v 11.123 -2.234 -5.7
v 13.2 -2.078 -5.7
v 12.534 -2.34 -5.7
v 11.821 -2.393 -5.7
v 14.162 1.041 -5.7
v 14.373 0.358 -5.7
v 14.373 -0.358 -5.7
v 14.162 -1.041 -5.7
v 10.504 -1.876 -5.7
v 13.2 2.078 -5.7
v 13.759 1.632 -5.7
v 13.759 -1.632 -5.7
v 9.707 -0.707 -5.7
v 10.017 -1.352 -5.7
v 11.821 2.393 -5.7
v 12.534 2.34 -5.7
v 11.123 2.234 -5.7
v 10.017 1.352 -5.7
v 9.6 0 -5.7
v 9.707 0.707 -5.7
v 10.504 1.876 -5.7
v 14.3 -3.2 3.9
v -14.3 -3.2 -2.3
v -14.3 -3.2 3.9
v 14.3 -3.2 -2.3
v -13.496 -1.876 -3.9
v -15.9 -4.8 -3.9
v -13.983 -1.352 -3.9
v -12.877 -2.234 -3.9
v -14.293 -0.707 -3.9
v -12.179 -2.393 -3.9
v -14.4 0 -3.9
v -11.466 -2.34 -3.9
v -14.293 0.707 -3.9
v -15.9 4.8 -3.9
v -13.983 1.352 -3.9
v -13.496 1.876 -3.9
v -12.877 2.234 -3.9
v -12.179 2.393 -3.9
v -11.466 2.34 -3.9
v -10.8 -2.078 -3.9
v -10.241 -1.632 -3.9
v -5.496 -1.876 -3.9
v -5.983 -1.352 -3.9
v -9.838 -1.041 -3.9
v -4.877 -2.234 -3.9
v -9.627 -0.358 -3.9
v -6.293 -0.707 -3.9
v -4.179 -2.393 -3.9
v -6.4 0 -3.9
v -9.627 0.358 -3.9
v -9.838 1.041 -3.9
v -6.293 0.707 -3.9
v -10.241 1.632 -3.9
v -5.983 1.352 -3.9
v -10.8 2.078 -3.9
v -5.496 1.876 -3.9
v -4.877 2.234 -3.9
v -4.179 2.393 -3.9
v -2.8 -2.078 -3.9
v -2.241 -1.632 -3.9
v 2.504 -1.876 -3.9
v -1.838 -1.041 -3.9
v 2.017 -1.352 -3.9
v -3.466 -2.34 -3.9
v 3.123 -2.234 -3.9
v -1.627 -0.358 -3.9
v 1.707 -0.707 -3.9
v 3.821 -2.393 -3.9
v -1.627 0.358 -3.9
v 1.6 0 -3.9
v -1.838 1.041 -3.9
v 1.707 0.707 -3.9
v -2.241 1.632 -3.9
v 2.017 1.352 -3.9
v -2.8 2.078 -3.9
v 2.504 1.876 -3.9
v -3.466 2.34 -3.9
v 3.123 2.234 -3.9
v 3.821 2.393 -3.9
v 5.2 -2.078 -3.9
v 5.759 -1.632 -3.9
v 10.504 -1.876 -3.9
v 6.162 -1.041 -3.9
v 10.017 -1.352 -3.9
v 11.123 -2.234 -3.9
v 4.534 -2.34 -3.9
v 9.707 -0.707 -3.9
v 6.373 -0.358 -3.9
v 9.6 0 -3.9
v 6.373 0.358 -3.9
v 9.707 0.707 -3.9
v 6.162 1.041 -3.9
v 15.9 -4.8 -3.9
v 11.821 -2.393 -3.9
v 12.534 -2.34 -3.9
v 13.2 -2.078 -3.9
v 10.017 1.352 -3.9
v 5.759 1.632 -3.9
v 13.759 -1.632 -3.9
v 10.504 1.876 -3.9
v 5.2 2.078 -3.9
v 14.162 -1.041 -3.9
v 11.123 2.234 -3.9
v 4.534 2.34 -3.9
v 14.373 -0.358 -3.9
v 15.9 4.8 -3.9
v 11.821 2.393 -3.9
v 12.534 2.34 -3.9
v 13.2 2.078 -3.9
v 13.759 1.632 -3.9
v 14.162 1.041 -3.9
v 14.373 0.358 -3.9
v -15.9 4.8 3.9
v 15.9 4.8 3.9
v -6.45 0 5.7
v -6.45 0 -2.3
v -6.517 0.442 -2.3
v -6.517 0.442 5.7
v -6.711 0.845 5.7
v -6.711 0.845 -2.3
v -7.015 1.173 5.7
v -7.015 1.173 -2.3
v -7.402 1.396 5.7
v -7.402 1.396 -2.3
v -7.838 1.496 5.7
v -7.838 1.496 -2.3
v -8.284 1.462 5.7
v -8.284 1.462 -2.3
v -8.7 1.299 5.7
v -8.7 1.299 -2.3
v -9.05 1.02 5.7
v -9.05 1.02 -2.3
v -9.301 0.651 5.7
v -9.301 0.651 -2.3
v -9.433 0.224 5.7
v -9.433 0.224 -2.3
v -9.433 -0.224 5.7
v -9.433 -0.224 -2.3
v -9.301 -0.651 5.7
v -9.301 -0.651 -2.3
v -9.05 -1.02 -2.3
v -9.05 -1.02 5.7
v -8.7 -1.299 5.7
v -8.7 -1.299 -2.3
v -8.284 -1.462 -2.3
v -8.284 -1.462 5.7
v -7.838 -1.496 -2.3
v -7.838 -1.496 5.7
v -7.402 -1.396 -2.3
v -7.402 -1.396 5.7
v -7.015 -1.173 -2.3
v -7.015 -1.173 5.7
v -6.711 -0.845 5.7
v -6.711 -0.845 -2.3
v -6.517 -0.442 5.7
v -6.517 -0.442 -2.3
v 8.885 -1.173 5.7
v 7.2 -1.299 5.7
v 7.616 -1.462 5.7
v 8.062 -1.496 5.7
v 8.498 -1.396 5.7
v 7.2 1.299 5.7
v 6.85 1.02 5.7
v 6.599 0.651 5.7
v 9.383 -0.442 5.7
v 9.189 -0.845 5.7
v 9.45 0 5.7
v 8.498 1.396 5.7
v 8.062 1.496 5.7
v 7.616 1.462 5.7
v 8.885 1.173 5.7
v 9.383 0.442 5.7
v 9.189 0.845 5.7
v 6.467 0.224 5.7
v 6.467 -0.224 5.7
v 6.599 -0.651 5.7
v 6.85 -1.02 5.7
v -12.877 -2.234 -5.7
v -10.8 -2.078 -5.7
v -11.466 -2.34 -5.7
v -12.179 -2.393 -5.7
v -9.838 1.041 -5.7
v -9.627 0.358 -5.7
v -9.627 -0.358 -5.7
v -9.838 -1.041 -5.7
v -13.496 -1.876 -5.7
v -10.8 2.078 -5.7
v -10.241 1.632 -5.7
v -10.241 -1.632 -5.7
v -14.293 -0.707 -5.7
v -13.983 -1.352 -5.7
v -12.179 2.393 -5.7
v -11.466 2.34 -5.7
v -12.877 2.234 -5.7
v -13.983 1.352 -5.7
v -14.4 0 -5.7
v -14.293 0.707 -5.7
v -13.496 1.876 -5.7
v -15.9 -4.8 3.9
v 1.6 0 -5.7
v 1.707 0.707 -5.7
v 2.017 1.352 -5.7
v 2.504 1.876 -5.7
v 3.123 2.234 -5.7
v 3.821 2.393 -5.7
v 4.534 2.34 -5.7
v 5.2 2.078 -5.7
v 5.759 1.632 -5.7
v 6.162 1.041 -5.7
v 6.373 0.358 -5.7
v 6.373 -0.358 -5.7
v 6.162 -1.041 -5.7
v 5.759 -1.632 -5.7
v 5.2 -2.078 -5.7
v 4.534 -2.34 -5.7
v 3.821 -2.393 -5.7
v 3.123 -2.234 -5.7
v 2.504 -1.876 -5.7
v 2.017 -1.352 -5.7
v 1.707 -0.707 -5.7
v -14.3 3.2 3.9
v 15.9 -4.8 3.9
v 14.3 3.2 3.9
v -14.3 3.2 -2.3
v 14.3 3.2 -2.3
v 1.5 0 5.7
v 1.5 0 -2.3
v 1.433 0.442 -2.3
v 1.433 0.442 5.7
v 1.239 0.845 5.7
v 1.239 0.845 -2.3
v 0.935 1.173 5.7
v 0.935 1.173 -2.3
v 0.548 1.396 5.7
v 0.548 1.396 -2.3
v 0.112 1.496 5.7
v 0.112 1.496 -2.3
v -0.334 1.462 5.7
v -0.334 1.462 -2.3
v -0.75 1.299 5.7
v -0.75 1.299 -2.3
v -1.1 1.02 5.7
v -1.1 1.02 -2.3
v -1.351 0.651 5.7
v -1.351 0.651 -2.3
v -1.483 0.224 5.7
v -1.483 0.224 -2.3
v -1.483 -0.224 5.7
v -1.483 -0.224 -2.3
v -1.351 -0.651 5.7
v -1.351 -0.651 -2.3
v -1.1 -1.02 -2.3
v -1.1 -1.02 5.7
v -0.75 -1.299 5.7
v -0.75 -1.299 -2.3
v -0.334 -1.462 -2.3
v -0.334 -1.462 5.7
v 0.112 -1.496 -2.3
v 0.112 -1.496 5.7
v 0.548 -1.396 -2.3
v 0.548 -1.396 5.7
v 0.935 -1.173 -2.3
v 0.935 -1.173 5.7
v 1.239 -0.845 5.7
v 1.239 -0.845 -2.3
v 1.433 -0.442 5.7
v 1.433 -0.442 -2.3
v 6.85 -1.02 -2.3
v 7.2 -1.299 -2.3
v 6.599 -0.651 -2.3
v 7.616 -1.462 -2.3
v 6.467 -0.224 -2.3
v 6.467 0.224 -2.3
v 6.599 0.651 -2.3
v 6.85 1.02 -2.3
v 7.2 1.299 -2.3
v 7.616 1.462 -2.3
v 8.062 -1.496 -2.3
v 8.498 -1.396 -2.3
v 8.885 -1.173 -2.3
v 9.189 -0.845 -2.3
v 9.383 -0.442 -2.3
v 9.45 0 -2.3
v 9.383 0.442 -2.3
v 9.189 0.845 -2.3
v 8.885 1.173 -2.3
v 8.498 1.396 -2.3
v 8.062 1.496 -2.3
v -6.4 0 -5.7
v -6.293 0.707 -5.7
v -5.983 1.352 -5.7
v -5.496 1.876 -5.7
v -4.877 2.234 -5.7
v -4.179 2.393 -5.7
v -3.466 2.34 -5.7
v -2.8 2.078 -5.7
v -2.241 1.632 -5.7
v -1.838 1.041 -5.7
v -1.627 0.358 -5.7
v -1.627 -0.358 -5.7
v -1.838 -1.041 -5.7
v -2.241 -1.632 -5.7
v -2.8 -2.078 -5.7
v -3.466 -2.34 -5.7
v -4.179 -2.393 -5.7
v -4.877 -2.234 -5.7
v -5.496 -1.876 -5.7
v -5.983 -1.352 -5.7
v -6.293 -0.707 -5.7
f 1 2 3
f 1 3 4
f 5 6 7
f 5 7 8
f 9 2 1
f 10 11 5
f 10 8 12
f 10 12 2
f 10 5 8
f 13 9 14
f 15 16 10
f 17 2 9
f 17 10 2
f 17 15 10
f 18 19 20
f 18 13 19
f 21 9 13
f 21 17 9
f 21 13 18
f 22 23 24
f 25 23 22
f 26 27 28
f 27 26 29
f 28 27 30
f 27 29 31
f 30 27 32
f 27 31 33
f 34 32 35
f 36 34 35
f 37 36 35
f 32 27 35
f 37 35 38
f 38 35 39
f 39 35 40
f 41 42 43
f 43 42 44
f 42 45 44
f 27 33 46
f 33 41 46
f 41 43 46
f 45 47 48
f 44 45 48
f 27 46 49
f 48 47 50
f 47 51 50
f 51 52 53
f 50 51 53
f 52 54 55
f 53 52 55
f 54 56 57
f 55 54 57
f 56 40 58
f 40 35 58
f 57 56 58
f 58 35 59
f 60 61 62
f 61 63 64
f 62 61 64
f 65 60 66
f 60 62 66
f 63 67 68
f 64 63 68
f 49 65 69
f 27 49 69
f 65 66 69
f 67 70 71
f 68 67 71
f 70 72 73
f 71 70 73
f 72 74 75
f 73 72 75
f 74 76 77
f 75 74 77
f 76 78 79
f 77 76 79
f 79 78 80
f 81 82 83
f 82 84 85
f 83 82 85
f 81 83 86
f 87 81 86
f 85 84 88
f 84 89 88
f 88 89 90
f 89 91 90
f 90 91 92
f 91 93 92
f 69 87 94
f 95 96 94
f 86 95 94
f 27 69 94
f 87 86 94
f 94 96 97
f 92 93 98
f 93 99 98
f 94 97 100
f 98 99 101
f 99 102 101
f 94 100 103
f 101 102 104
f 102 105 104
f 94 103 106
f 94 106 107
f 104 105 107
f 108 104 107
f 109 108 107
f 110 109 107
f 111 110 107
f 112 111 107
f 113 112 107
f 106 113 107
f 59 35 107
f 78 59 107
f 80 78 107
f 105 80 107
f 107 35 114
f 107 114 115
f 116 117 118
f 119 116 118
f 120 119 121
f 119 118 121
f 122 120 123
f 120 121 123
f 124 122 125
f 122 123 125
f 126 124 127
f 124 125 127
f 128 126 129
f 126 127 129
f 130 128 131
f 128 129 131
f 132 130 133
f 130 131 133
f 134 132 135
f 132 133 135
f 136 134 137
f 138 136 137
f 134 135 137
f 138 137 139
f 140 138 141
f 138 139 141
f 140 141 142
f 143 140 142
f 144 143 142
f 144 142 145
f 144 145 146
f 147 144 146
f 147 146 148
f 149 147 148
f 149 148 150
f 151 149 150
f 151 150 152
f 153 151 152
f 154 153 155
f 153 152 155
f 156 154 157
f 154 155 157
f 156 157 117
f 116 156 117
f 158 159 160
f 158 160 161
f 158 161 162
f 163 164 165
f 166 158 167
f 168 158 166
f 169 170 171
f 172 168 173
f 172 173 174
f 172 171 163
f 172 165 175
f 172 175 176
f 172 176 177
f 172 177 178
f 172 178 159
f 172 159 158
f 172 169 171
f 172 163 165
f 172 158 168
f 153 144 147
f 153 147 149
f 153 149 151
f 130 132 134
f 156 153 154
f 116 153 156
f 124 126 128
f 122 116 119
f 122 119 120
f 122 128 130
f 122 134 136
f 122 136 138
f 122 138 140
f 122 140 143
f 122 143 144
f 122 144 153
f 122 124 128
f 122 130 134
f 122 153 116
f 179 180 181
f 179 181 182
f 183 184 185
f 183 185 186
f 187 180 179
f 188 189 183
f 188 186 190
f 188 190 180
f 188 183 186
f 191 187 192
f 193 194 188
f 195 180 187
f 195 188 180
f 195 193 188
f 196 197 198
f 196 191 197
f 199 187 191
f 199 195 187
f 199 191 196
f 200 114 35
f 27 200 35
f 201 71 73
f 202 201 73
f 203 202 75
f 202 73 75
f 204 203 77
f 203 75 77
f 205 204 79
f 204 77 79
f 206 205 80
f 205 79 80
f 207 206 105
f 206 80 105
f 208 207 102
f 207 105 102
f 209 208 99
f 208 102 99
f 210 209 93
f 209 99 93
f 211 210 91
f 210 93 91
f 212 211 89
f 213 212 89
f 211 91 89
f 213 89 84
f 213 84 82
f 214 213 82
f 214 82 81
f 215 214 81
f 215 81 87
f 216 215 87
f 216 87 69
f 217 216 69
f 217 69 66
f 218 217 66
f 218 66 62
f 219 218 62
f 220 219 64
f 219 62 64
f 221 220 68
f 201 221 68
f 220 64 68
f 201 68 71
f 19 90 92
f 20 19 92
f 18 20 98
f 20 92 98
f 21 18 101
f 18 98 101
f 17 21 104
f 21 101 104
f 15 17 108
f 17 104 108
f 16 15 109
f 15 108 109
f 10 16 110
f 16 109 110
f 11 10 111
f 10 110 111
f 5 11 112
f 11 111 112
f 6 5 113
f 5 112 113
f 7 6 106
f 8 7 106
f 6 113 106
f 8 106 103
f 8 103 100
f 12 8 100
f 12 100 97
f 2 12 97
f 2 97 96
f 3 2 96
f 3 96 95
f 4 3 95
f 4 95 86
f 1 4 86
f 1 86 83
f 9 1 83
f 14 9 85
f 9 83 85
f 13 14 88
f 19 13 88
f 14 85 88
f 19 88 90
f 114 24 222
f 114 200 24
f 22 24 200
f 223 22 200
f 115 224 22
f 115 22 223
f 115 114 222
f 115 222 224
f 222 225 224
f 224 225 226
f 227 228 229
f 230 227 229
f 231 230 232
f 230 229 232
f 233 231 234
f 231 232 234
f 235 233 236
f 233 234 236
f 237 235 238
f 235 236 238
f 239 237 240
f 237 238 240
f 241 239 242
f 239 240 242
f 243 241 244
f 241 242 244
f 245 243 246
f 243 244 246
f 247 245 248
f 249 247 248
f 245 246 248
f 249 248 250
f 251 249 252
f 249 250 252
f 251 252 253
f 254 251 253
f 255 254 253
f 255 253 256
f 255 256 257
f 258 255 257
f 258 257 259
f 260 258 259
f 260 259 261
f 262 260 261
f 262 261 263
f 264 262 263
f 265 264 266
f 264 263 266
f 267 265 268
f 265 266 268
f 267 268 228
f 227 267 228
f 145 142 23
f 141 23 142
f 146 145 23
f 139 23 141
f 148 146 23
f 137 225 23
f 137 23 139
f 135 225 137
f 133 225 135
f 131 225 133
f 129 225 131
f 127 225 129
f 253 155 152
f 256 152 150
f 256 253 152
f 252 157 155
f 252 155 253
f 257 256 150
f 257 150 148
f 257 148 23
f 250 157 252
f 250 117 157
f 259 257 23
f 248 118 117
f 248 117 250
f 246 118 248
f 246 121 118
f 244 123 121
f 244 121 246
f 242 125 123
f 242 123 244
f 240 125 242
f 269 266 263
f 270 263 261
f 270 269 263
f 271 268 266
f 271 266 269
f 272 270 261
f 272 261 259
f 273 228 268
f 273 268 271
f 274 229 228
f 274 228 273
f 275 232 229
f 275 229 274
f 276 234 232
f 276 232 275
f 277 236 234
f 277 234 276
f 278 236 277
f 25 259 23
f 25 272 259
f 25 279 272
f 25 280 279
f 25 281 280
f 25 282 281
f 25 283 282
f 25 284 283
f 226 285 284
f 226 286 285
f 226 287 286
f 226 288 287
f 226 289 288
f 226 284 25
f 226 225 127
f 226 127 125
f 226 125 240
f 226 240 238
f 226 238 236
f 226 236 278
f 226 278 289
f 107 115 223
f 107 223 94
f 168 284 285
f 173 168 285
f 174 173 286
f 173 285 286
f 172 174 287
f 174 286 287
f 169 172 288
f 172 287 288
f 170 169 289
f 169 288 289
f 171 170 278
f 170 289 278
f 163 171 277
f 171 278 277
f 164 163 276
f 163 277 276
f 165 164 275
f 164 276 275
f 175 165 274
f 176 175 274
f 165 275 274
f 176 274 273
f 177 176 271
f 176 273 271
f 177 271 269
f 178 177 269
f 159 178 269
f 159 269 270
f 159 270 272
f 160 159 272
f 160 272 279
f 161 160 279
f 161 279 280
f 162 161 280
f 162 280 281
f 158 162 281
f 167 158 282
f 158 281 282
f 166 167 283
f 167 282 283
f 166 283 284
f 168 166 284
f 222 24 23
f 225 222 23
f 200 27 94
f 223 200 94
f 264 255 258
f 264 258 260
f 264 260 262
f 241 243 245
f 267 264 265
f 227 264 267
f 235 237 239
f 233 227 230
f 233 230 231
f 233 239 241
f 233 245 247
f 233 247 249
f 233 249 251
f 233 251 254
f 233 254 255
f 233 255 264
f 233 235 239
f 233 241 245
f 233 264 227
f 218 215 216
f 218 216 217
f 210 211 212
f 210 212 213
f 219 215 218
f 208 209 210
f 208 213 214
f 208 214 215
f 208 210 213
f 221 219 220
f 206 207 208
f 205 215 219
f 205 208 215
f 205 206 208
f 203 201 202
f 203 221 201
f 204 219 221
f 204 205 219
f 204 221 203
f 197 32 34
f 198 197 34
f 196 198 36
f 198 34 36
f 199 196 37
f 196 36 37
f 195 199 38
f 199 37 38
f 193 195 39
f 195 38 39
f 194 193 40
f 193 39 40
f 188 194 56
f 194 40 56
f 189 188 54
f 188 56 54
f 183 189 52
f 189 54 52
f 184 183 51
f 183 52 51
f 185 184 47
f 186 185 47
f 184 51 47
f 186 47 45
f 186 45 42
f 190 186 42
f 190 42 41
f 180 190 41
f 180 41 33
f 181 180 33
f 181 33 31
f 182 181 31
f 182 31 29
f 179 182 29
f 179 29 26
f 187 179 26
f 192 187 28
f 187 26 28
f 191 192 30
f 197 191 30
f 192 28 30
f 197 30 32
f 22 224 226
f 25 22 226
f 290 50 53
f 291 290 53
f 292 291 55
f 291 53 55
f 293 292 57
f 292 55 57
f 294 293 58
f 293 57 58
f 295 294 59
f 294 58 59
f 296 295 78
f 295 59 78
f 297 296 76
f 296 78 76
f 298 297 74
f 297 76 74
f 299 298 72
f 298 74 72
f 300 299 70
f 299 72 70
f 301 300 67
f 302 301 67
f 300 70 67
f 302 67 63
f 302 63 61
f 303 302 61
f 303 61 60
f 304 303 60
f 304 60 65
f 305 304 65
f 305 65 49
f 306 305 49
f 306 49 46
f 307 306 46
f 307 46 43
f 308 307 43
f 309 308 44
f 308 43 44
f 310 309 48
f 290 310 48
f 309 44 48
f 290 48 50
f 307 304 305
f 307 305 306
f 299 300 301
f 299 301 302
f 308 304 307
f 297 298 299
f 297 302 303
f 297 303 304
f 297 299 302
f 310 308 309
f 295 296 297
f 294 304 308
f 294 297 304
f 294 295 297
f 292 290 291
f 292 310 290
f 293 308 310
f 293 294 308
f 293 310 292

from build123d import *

# Parameters (mm, degrees)
SKETCH1_W           = 31.8
SKETCH1_H           = 7.8
BOSS_EXTRUDE1_DEPTH = 4.8
SHELL2_T            = -1.6
SKETCH2_R           = 2.4
BOSS_EXTRUDE2_DEPTH = 1.8
LPATTERN1_COUNT     = 6
LPATTERN1_PITCH     = 8
SKETCH3_R           = 1.5
BOSS_EXTRUDE3_DEPTH = 8
LPATTERN2_COUNT     = 3
LPATTERN2_PITCH     = 7.95


with BuildPart() as part:
    # Sketch1 → Boss-Extrude1 (new body, symmetric)
    with BuildSketch(Plane(origin=(0, 0, 0), x_dir=(1, 0, 0), z_dir=(0, 1, 0))):
        Rectangle(SKETCH1_W, SKETCH1_H)
    extrude(amount=BOSS_EXTRUDE1_DEPTH, both=True)

    # Shell2
    shell2_openings = [part.faces().sort_by_distance(p)[0] for p in [
        (0, 0, 3.9),
    ]]
    offset(amount=SHELL2_T, openings=shell2_openings, kind=Kind.INTERSECTION)

    # Sketch2 → Boss-Extrude2 (add)
    with BuildSketch(Plane(origin=(0, 0, -3.9), x_dir=(-1, 0, 0), z_dir=(0, 0, -1))):
        with Locations((12, 0)):
            Circle(SKETCH2_R)
    boss_extrude2 = extrude(amount=BOSS_EXTRUDE2_DEPTH)

    # LPattern1: Boss-Extrude2 ×6, 2 skipped
    with Locations(*[(i * LPATTERN1_PITCH, 0, 0) for i in range(1, LPATTERN1_COUNT) if i not in (4, 5)]):
        add(boss_extrude2)

    # Sketch3 → Boss-Extrude3 (add)
    with BuildSketch(Plane.XY.offset(-2.3)):
        with Locations((-7.95, 0)):
            Circle(SKETCH3_R)
    boss_extrude3 = extrude(amount=BOSS_EXTRUDE3_DEPTH)

    # LPattern2: Boss-Extrude3 ×3
    with Locations(*[(i * LPATTERN2_PITCH, 0, 0) for i in range(1, LPATTERN2_COUNT)]):
        add(boss_extrude3)


solid = part.part
